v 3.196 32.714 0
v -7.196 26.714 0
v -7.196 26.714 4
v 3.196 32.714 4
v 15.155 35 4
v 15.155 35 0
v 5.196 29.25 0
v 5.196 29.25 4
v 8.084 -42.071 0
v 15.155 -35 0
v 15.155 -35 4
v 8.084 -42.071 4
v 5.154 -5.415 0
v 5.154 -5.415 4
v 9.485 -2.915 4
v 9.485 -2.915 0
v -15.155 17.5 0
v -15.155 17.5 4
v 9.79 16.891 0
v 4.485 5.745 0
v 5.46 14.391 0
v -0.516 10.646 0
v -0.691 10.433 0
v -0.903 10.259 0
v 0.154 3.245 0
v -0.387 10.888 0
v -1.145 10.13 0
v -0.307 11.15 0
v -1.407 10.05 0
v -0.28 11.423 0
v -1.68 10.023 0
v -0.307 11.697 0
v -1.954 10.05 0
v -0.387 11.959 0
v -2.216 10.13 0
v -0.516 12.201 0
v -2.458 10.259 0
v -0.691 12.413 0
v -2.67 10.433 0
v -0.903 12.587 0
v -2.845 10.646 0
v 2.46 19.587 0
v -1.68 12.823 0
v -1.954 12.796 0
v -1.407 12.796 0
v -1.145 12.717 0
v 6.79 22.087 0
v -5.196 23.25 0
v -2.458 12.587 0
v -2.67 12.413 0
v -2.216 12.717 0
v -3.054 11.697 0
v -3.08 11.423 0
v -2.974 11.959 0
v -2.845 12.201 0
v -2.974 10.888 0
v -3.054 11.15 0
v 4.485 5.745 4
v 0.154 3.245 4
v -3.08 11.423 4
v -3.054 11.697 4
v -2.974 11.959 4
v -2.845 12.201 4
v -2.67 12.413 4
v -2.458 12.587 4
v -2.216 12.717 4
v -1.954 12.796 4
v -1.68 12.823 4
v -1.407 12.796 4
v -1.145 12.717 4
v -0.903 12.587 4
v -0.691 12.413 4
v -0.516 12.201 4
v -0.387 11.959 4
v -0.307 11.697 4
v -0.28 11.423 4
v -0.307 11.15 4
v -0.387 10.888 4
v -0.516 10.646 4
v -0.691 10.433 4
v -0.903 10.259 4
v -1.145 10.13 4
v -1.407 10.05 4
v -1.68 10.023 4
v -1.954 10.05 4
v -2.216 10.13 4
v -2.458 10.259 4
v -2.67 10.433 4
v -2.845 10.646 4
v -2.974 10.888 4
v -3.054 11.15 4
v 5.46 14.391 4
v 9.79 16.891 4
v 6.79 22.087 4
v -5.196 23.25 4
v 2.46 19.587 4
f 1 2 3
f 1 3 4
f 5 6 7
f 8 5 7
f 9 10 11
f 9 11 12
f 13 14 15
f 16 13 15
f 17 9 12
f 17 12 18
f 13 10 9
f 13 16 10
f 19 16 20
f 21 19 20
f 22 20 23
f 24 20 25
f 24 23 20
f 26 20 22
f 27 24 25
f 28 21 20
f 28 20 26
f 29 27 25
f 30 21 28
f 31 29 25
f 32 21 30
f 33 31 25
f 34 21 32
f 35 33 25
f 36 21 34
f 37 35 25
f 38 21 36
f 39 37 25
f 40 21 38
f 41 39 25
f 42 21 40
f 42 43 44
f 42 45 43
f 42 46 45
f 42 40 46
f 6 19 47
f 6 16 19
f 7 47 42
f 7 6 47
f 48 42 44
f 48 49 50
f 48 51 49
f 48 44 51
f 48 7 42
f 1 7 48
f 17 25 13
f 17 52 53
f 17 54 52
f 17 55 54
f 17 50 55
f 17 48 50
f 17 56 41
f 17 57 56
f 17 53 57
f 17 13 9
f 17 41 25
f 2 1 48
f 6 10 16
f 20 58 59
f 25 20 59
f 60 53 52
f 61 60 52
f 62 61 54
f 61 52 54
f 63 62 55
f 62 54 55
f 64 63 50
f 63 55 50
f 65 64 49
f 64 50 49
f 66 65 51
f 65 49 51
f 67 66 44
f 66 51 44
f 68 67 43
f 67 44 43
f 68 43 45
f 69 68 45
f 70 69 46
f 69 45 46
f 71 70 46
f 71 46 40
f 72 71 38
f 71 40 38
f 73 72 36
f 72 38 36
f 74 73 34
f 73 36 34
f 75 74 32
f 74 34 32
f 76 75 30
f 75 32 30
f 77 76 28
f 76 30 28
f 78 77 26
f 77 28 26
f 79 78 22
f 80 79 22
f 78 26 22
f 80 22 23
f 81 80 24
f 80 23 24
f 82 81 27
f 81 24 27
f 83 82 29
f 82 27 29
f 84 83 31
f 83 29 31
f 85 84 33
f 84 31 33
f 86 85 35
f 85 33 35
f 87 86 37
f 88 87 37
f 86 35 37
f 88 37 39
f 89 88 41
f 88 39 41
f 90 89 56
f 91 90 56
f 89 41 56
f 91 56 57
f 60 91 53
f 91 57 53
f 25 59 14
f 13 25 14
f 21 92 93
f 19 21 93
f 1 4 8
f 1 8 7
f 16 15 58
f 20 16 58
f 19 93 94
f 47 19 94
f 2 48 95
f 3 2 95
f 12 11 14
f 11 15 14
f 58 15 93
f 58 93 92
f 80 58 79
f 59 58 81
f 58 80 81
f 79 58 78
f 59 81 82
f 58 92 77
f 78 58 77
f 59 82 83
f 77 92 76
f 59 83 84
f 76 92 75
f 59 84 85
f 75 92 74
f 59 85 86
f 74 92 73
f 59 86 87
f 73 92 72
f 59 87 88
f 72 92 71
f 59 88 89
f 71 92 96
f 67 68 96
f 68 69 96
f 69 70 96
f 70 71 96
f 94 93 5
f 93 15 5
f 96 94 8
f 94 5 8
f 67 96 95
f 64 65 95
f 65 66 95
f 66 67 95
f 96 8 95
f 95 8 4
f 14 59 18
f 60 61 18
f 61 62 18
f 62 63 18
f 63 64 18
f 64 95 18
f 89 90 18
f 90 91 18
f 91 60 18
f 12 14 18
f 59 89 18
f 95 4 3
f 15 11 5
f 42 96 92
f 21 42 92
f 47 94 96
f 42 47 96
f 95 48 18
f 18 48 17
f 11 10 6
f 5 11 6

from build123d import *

# Parameters (mm, degrees)
EXTRUDE_1_DEPTH     = 4
EXTRUDE_2_DEPTH     = 5
CUT_EXTRUDE_1_DEPTH = 5
CUT_EXTRUDE_3_DEPTH = 5
EXTRUDE_3_DEPTH     = 4
SKETCH_8_W          = 12
SKETCH_8_H          = 4
CUT_EXTRUDE_4_DEPTH = 1
SKETCH_9_R          = 1.4
CUT_EXTRUDE_5_DEPTH = 4


with BuildPart() as part:
    # 草图1 → 凸台-拉伸1 (new body)
    with BuildSketch(Plane.XY):
        Polygon((-15.155444566, 17.5), (15.155444566, -35), (15.155444566, 35), align=None)
    extrude(amount=EXTRUDE_1_DEPTH)

    # 草图3 → 凸台-拉伸2 (add)
    with BuildSketch(Plane(origin=(-11.366583425, 19.6875, 0), x_dir=(0.8660254037844398, 0.499999999999998, 0), z_dir=(-0.49999999999999806, 0.8660254037844399, 0))):
        Polygon((7.125, -4), (13.125, -4), (19.125, -4), (19.125, 0), (7.125, 0), align=None)
    extrude(amount=EXTRUDE_2_DEPTH)

    # 草图4 → 切除-拉伸1 (cut)
    with BuildSketch(Plane(origin=(117.013646285, -126.133628904, 5), x_dir=(0.9999710727819138, 0.007606155361845417, 0), z_dir=(0, 0, 1))):
        Polygon((-106.588705014, 124.032873802), (-111.52268914, 132.7309081), (-115.871706289, 130.263916037), (-110.937722163, 121.565881739), align=None)
    extrude(amount=-CUT_EXTRUDE_1_DEPTH, mode=Mode.SUBTRACT)

    # 草图6 → 切除-拉伸3 (cut)
    with BuildSketch(Plane(origin=(116.750820958, -91.580334705, 5), x_dir=(0.9999710727819138, 0.007606155361845417, 0), z_dir=(0, 0, 1))):
        Polygon((-113.442317429, 112.033605516), (-110.481926953, 106.814784937), (-106.132909805, 109.281777), (-109.09330028, 114.500597579), align=None)
    extrude(amount=-CUT_EXTRUDE_3_DEPTH, mode=Mode.SUBTRACT)

    # 草图7 → 凸台-拉伸3 (add)
    with BuildSketch(Plane(origin=(0, 0, 0), x_dir=(-1, 0, 0), z_dir=(0, 0, -1))):
        Polygon((15.155444566, 17.5), (-15.155444566, -35), (-8.084376754, -42.071067812), align=None)
    extrude(amount=-EXTRUDE_3_DEPTH)

    # 草图8 → 切除-拉伸4 (cut)
    with BuildSketch(Plane(origin=(-13.866583425, 24.017627019, 0), x_dir=(0.8660254037844398, 0.49999999999999806, 0), z_dir=(-0.499999999999998, 0.8660254037844397, 0))):
        with Locations((13.125, -2)):
            Rectangle(SKETCH_8_W, SKETCH_8_H)
    extrude(amount=-CUT_EXTRUDE_4_DEPTH, mode=Mode.SUBTRACT)

    # 草图9 → 切除-拉伸5 (cut)
    with BuildSketch(Plane(origin=(116.744731615, -90.779776973, 0), x_dir=(-0.9999710727819138, -0.007606155361845545, 0), z_dir=(0, 0, -1))):
        with Locations(Location((117.644385016, 103.100964858, 0), (0, 0, 0.435804803))):
            Circle(SKETCH_9_R)
    extrude(amount=-CUT_EXTRUDE_5_DEPTH, mode=Mode.SUBTRACT)


solid = part.part
